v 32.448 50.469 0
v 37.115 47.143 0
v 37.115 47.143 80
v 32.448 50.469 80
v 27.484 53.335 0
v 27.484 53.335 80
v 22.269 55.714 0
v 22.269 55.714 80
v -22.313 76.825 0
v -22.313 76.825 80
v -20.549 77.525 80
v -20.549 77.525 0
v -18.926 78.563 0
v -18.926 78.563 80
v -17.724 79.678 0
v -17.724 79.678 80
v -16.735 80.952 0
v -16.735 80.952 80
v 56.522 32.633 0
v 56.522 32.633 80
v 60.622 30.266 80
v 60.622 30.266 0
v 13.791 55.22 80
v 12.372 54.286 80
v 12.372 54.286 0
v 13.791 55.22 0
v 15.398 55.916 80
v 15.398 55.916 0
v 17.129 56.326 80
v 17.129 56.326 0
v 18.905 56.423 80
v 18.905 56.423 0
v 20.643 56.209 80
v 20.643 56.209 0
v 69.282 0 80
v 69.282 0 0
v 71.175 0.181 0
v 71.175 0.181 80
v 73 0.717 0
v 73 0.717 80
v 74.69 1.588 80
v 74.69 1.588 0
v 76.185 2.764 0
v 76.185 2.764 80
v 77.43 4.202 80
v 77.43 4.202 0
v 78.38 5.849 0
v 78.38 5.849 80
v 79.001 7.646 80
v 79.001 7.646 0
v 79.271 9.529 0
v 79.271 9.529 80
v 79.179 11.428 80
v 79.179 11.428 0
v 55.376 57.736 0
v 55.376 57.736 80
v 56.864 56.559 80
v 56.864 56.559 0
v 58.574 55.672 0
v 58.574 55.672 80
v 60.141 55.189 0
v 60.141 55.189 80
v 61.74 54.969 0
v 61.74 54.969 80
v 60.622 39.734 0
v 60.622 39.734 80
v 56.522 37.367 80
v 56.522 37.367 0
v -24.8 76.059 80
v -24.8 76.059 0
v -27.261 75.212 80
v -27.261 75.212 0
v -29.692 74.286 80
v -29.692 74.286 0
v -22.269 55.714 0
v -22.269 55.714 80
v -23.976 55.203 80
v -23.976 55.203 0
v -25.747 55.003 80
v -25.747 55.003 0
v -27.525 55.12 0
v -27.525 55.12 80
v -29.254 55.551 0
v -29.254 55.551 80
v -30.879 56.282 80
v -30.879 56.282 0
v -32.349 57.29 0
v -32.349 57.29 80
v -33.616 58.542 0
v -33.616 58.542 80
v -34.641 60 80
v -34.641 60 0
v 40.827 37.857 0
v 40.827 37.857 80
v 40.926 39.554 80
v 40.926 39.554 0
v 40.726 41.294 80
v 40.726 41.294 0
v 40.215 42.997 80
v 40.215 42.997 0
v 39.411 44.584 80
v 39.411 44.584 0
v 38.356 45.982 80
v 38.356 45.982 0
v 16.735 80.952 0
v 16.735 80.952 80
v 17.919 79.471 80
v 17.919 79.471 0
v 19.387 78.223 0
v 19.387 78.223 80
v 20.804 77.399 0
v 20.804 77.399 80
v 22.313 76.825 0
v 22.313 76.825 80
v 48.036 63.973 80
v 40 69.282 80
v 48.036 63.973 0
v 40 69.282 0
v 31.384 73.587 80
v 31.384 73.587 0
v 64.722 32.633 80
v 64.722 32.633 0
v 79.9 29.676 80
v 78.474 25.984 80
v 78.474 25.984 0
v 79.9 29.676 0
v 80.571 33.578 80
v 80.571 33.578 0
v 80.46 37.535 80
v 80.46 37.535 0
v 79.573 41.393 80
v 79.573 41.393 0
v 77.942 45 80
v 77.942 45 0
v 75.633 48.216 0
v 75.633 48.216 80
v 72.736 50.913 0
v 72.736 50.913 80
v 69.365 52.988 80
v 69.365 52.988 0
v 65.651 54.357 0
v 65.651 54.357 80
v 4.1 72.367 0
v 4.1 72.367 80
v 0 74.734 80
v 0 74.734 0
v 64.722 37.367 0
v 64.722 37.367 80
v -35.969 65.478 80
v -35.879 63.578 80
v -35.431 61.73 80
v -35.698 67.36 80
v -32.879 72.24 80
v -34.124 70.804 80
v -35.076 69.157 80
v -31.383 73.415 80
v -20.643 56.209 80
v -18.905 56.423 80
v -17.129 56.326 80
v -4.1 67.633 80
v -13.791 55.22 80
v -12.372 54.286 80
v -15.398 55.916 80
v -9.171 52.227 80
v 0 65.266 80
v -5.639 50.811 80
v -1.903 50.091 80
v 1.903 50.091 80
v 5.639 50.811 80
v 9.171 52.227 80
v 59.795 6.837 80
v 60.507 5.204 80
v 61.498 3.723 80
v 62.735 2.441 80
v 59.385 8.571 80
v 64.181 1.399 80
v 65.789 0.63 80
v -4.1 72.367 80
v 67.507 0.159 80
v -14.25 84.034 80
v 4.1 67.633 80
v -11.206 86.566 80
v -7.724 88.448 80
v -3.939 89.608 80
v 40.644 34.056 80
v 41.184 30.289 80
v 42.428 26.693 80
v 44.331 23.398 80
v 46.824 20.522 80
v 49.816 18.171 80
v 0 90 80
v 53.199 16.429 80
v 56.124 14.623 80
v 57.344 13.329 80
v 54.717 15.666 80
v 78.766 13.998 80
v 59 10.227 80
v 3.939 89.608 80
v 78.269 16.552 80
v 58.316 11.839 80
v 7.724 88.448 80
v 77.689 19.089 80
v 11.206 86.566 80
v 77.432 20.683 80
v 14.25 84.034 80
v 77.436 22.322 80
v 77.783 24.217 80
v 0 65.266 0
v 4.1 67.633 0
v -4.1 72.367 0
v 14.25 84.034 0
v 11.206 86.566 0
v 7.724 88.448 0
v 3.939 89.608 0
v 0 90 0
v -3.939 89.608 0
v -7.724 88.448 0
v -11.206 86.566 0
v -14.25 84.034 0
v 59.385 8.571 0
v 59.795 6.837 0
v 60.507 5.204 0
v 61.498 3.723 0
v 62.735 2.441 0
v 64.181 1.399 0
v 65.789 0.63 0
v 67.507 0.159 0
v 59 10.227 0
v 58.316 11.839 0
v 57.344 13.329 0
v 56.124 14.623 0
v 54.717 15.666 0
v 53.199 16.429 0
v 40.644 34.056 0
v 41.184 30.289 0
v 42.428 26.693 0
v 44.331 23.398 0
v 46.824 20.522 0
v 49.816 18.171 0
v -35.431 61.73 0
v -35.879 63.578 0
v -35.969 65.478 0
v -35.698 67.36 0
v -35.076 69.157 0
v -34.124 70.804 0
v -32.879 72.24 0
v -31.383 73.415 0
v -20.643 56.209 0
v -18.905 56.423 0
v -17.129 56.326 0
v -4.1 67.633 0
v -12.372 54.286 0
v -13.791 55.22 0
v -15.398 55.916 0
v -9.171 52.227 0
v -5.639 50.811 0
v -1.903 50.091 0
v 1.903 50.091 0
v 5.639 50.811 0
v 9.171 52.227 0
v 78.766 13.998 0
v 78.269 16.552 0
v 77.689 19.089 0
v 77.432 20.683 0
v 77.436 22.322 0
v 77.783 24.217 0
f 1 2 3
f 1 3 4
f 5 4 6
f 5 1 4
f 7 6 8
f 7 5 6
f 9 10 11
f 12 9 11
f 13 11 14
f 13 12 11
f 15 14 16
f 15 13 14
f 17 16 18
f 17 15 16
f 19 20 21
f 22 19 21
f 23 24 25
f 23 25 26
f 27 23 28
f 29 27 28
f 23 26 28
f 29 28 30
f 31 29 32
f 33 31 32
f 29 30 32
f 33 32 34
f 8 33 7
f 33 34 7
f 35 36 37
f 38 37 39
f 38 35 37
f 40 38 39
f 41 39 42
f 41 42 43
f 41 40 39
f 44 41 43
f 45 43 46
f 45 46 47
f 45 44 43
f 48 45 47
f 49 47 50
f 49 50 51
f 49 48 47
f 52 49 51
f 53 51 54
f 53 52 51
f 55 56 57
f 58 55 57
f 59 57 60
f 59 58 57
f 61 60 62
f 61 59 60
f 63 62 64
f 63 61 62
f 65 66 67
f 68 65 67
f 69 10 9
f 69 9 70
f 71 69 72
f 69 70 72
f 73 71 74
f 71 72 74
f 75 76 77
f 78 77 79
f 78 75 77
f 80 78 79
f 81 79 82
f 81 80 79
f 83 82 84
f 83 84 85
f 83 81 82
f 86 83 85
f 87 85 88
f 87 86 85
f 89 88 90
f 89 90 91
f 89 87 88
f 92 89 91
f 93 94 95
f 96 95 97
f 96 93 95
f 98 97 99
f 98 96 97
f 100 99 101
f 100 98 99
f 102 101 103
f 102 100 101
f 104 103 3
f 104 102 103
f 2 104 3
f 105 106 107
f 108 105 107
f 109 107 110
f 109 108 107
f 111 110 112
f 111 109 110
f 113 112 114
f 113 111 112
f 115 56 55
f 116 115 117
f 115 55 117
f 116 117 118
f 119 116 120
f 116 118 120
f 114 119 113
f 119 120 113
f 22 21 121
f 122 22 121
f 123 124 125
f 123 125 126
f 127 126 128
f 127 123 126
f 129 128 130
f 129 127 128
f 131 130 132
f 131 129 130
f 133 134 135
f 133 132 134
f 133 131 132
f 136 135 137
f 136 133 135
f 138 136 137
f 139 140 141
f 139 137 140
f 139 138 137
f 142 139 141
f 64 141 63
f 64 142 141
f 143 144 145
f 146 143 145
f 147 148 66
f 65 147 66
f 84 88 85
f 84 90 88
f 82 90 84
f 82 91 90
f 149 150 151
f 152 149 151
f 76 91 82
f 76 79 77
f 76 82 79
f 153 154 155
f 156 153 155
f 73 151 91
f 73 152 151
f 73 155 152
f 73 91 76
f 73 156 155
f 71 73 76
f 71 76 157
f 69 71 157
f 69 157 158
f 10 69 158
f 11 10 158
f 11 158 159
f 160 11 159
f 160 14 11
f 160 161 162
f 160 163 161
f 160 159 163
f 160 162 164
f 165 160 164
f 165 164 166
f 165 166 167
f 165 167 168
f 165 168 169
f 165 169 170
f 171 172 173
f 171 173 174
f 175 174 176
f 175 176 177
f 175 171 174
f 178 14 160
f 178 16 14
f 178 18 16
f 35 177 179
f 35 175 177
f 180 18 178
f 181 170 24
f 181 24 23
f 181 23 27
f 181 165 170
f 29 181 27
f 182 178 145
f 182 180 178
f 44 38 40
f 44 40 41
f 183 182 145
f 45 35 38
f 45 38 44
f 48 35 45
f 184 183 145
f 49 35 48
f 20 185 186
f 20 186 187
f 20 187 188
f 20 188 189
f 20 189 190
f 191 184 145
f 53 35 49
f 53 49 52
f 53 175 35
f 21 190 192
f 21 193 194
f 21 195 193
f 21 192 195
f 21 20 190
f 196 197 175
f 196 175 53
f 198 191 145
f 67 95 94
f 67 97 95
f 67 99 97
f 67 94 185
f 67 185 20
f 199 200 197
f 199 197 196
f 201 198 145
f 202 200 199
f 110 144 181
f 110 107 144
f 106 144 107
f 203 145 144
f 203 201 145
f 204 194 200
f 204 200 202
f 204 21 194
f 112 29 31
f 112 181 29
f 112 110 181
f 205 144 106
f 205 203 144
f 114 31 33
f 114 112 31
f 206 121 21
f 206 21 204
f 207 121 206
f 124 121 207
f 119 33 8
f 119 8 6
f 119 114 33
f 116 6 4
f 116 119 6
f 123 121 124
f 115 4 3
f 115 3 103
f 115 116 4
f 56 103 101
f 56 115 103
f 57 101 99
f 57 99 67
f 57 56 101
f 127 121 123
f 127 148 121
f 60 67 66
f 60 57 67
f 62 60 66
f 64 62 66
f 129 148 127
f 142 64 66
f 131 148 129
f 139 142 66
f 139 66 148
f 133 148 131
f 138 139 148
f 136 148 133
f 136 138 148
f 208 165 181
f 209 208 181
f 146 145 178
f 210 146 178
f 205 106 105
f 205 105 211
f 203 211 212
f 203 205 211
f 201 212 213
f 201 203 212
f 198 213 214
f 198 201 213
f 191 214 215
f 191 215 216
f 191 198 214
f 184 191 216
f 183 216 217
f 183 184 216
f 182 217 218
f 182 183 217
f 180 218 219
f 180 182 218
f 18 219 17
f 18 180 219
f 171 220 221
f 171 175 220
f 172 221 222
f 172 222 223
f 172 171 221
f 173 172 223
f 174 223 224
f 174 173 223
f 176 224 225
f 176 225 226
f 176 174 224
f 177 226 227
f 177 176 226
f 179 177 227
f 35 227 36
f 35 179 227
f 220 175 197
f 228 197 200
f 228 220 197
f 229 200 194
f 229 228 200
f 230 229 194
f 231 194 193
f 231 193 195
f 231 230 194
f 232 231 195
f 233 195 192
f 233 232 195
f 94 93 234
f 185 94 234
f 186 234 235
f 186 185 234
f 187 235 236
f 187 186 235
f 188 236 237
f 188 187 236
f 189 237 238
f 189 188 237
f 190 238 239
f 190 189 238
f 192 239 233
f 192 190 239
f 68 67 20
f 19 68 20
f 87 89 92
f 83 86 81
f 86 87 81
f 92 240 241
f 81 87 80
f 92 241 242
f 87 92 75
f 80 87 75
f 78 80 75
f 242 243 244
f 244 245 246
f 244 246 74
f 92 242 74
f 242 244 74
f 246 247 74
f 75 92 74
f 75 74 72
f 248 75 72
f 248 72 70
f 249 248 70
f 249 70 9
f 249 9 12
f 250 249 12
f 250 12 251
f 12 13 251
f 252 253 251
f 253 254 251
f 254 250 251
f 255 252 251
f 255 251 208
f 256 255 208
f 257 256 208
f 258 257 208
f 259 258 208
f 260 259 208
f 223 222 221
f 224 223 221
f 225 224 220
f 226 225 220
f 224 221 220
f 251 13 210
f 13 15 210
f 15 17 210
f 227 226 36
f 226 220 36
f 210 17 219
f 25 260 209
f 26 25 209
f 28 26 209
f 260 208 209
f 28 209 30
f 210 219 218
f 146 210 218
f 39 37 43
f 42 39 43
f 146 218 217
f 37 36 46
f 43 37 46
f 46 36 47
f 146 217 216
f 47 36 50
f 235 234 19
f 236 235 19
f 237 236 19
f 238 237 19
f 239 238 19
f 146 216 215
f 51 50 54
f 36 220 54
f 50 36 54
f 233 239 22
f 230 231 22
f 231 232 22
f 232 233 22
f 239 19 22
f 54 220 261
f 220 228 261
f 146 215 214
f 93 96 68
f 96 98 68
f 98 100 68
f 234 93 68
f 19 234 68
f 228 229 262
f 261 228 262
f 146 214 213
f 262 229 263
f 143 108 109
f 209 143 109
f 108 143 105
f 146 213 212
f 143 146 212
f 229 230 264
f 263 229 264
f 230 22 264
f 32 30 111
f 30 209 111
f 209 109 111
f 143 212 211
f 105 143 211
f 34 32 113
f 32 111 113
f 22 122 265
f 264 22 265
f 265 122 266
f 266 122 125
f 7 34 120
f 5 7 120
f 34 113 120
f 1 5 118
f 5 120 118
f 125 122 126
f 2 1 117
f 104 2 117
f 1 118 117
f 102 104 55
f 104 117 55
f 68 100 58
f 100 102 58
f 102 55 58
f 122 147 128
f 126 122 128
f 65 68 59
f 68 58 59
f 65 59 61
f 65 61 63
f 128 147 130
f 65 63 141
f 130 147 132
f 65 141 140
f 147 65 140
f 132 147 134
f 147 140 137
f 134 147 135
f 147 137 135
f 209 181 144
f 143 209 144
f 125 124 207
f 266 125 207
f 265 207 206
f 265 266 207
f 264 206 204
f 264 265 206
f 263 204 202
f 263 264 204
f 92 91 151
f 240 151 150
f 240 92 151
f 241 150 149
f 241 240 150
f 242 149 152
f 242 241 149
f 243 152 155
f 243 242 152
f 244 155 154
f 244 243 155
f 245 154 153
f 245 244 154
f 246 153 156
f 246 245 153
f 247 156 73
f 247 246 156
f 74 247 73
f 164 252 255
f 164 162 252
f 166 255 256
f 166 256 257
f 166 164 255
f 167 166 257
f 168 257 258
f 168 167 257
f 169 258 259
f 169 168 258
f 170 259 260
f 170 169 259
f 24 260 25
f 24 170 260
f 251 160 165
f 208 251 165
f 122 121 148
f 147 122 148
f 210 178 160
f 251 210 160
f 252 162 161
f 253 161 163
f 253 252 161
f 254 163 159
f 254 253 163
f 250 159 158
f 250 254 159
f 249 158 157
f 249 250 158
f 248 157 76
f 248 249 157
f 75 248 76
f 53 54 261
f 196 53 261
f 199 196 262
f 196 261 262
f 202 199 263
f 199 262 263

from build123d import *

# Parameters (mm, degrees)
SKETCH_1_R          = 80
SKETCH_1_R_2        = 60
EXTRUDE_1_DEPTH     = 80
CUT_EXTRUDE_1_DEPTH = 139.564064606
CUT_EXTRUDE_2_DEPTH = 139.564064606
SKETCH_4_R          = 20
SKETCH_4_R_2        = 7.5
EXTRUDE_2_DEPTH     = 80
FILLET_1_R          = 10


with BuildPart() as part:
    # 草图1 → 凸台-拉伸1 (new body)
    with BuildSketch(Plane.XY):
        Circle(SKETCH_1_R)
        Circle(SKETCH_1_R_2, mode=Mode.SUBTRACT)
    extrude(amount=EXTRUDE_1_DEPTH)

    # 草图2 → 切除-拉伸1 (cut, through all)
    with BuildSketch(Plane.XY.offset(80)):
        Polygon((60.621778265, 30.265727793), (64.721778265, 32.632863896), (64.721778265, 37.367136104), (60.621778265, 39.734272207), (56.521778265, 37.367136104), (56.521778265, 32.632863896), align=None)
        Polygon((4.1, 67.632863896), (4.1, 72.367136104), (0, 74.734272207), (-4.1, 72.367136104), (-4.1, 67.632863896), (0, 65.265727793), align=None)
        Polygon((56.521778265, -37.367136104), (60.621778265, -39.734272207), (64.721778265, -37.367136104), (64.721778265, -32.632863896), (60.621778265, -30.265727793), (56.521778265, -32.632863896), align=None)
        Polygon((-4.1, -67.632863896), (-4.1, -72.367136104), (0, -74.734272207), (4.1, -72.367136104), (4.1, -67.632863896), (0, -65.265727793), align=None)
        Polygon((-60.621778265, -30.265727793), (-64.721778265, -32.632863896), (-64.721778265, -37.367136104), (-60.621778265, -39.734272207), (-56.521778265, -37.367136104), (-56.521778265, -32.632863896), align=None)
        Polygon((-56.521778265, 37.367136104), (-60.621778265, 39.734272207), (-64.721778265, 37.367136104), (-64.721778265, 32.632863896), (-60.621778265, 30.265727793), (-56.521778265, 32.632863896), align=None)
    extrude(amount=-CUT_EXTRUDE_1_DEPTH, mode=Mode.SUBTRACT)

    # 草图3 → 切除-拉伸2 (cut, through all)
    with BuildSketch(Plane.XY.offset(80)):
        with BuildLine():
            Line((0, 0), (-40, 69.282032303))
            ThreePointArc((-40, 69.282032303), (-40, -69.282032303), (80, 0))
            Line((80, 0), (0, 0))
        make_face()
    extrude(amount=-CUT_EXTRUDE_2_DEPTH, mode=Mode.SUBTRACT)

    # 草图4 → 凸台-拉伸2 (add)
    # profile 1 of 2: a face of its own
    with BuildSketch(Plane.XY.offset(80)):
        with Locations((0, 70)):
            Circle(SKETCH_4_R)
        with Locations((0, 70)):
            Circle(SKETCH_4_R_2, mode=Mode.SUBTRACT)
    # profile 2 of 2: a face of its own
    with BuildSketch(Plane.XY.offset(80)):
        with Locations((60.621778265, 35)):
            Circle(SKETCH_4_R)
        with Locations((60.621778265, 35)):
            Circle(SKETCH_4_R_2, mode=Mode.SUBTRACT)
    extrude(amount=-EXTRUDE_2_DEPTH)

    # 圆角1
    fillet_1_edges = [part.edges().sort_by_distance(p)[0] for p in [
        (76.622258716, 23.000640628, 40),
        (58.230268445, 54.856502229, 40),
        (18.391990271, 77.857142857, 40),
        (-18.391990271, 77.857142857, 40),
        (15.891853901, 57.857142857, 40),
        (-15.891853901, 57.857142857, 40),
        (58.051682455, 15.165822237, 40),
        (42.159828554, 42.69132062, 40),
    ]]
    fillet(fillet_1_edges, radius=FILLET_1_R)
    fillet_1_2_edges = [part.edges().sort_by_distance(p)[0] for p in [
        (60, 0, 40),
        (80, 0, 40),
        (-30, 51.961524227, 40),
        (-40, 69.282032303, 40),
    ]]
    fillet(fillet_1_2_edges, radius=FILLET_1_R - 0.0001)  # a hair under: the kernel refuses the full size


solid = part.part
